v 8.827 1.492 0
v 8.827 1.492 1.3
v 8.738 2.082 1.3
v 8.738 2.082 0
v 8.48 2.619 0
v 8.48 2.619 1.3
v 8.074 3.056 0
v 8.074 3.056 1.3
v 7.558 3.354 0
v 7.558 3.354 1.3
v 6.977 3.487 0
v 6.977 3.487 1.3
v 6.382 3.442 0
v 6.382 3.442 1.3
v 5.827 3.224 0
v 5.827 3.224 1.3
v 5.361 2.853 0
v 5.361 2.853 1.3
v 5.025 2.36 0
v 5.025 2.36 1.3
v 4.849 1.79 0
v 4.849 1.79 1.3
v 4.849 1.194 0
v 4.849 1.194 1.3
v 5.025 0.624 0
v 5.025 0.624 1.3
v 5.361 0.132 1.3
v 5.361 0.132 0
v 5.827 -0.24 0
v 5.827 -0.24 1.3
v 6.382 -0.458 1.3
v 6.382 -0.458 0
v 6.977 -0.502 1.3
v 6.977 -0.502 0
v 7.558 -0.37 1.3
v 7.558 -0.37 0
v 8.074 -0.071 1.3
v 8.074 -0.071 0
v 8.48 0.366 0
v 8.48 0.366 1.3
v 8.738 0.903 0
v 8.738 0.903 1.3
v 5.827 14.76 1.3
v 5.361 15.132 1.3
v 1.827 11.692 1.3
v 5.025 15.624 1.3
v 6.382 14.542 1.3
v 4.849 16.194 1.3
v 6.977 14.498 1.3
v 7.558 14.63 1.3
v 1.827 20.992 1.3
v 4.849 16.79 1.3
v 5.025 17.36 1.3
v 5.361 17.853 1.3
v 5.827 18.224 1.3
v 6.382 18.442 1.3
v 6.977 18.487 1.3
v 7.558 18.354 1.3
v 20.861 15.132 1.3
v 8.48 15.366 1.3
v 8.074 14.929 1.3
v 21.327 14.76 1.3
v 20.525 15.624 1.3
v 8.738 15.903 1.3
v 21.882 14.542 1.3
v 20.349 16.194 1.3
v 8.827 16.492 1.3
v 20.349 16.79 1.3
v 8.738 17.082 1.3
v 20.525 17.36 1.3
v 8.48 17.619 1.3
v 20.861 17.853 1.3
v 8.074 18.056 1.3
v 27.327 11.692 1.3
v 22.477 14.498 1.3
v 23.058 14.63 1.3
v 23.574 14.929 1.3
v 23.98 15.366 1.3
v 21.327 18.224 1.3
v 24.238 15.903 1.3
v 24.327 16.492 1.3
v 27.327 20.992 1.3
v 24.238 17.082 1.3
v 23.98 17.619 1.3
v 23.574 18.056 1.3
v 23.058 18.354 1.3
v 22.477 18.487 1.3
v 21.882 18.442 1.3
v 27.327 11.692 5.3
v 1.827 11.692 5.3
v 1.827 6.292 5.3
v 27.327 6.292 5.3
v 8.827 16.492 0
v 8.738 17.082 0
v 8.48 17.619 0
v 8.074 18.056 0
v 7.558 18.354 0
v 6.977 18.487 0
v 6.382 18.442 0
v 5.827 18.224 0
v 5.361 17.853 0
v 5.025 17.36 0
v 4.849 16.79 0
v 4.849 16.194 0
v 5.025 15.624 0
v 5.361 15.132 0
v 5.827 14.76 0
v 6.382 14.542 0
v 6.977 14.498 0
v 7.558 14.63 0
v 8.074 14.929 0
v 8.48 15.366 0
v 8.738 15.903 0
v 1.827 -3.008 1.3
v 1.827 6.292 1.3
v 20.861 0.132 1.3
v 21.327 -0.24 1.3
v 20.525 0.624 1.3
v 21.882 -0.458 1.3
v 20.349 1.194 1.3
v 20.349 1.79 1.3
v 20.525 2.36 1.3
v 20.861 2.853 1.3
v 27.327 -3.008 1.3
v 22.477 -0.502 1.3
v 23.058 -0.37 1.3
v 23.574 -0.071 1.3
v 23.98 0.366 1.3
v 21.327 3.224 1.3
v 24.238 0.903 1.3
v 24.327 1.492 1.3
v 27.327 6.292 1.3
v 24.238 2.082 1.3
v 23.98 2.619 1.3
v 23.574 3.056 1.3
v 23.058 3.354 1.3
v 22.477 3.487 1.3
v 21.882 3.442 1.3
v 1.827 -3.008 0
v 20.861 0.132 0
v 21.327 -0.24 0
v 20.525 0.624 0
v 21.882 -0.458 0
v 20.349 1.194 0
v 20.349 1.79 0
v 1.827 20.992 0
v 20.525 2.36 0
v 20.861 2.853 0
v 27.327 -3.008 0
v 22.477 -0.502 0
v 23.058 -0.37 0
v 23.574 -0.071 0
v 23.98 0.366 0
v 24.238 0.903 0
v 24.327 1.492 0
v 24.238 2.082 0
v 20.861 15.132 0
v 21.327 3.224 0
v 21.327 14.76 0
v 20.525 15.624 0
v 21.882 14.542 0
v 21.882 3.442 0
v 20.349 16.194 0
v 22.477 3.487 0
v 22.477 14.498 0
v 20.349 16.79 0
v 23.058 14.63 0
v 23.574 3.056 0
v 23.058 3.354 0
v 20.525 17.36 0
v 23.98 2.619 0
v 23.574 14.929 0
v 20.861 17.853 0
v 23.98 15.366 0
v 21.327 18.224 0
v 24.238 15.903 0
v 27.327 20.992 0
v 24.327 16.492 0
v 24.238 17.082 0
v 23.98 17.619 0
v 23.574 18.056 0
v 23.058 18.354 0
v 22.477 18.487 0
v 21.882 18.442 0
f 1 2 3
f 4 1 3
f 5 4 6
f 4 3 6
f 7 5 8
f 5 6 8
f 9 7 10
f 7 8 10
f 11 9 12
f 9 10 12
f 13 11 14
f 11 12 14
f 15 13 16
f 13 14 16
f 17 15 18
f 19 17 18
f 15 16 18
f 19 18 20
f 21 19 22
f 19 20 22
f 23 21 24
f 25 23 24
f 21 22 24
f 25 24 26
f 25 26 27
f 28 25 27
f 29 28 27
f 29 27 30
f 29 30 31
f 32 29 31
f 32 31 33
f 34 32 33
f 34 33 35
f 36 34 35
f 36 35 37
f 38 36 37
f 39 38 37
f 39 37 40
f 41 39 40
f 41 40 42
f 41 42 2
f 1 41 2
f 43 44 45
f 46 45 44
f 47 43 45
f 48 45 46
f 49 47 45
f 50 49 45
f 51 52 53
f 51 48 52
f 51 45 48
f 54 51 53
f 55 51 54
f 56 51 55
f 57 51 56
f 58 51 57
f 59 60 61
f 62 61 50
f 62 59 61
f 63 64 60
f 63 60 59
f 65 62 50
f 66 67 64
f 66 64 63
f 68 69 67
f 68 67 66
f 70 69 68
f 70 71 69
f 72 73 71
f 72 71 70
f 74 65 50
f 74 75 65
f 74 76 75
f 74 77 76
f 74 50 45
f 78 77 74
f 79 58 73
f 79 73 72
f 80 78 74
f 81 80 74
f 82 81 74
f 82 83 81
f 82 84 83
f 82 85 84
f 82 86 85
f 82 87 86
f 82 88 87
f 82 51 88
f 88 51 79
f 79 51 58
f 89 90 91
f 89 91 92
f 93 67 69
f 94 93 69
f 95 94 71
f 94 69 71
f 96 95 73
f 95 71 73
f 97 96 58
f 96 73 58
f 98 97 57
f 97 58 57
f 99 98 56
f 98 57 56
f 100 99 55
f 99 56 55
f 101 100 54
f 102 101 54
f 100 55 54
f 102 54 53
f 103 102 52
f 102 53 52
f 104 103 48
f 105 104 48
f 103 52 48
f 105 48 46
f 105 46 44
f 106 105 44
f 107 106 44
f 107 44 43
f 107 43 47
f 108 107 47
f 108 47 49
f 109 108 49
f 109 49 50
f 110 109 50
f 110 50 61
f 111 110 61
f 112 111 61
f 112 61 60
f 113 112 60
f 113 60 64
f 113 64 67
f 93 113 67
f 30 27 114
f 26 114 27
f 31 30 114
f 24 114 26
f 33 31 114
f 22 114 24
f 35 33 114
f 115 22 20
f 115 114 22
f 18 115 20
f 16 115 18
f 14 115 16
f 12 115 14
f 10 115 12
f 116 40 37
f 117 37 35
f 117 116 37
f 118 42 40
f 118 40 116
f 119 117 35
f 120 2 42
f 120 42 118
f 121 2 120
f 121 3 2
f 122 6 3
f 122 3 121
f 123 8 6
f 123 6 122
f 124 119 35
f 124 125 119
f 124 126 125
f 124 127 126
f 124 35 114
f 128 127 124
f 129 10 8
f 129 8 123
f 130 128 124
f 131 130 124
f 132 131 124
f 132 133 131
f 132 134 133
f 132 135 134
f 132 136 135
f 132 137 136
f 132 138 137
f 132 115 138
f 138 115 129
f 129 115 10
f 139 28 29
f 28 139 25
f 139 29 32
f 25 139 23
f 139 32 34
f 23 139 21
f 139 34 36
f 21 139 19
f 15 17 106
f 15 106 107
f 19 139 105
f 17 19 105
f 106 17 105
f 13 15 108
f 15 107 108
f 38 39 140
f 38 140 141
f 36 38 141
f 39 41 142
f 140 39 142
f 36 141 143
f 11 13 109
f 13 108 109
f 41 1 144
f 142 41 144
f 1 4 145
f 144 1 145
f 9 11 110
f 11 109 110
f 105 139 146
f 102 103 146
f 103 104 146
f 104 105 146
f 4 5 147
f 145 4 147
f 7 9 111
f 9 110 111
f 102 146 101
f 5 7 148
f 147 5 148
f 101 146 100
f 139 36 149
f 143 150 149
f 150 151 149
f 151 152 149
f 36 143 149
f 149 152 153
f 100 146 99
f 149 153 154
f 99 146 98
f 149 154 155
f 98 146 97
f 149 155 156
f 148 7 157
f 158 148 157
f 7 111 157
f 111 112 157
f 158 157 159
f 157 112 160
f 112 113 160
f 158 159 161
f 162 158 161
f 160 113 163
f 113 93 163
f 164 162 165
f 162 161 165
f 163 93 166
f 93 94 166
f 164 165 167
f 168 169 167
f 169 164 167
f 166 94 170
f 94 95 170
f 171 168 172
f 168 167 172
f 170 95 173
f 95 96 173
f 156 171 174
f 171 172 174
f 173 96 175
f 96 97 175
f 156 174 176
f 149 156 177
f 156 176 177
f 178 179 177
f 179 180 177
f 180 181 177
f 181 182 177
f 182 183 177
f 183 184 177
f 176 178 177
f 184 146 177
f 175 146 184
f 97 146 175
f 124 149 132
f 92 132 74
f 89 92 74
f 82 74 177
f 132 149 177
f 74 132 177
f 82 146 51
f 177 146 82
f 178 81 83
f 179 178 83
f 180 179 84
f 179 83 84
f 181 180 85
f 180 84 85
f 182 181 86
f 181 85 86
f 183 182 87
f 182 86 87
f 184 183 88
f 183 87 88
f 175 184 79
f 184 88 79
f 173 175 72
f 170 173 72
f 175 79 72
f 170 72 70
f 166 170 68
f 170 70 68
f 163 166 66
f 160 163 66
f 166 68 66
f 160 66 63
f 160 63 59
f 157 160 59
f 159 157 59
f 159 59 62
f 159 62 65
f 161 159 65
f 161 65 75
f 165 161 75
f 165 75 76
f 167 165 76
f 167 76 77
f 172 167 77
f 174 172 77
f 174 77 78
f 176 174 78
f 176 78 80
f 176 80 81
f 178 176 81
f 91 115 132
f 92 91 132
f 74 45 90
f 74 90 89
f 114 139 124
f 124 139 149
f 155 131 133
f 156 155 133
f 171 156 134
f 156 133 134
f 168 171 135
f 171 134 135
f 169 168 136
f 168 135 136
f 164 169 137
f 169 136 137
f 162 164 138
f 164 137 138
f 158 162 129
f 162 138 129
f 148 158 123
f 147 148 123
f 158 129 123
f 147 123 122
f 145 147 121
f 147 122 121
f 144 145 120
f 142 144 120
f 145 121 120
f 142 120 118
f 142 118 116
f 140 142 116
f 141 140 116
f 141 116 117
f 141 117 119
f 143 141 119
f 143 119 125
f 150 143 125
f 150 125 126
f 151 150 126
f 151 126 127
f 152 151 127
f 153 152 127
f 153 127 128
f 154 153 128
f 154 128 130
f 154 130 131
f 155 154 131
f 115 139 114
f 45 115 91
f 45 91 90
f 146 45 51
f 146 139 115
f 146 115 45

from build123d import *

# Parameters (mm, degrees)
SKETCH1_W           = 25.5
SKETCH1_H           = 24
BOSS_EXTRUDE1_DEPTH = 1.3
SKETCH2_W           = 25.5
SKETCH2_H           = 5.4
BOSS_EXTRUDE2_DEPTH = 4
SKETCH3_R           = 2
CUT_EXTRUDE1_DEPTH  = 4
SKETCH4_R           = 2
CUT_EXTRUDE2_DEPTH  = 4


with BuildPart() as part:
    # Sketch1 → Boss-Extrude1 (new body)
    with BuildSketch(Plane.XY):
        with Locations((14.577148508, 8.992218626)):
            Rectangle(SKETCH1_W, SKETCH1_H)
    extrude(amount=BOSS_EXTRUDE1_DEPTH)

    # Sketch2 → Boss-Extrude2 (add)
    with BuildSketch(Plane.XY.offset(1.3)):
        with Locations((14.577148508, 8.992218626)):
            Rectangle(SKETCH2_W, SKETCH2_H)
    extrude(amount=BOSS_EXTRUDE2_DEPTH)

    # Sketch3 → Cut-Extrude1 (cut)
    with BuildSketch(Plane.XY.offset(1.3)):
        with Locations((22.327148508, 16.492218626)):
            Circle(SKETCH3_R)
        with Locations((6.827148508, 16.492218626)):
            Circle(SKETCH3_R)
    extrude(amount=-CUT_EXTRUDE1_DEPTH, mode=Mode.SUBTRACT)

    # Sketch4 → Cut-Extrude2 (cut)
    with BuildSketch(Plane.XY.offset(1.3)):
        with Locations((6.827148508, 1.492218626)):
            Circle(SKETCH4_R)
        with Locations((22.327148508, 1.492218626)):
            Circle(SKETCH4_R)
    extrude(amount=-CUT_EXTRUDE2_DEPTH, mode=Mode.SUBTRACT)


solid = part.part
